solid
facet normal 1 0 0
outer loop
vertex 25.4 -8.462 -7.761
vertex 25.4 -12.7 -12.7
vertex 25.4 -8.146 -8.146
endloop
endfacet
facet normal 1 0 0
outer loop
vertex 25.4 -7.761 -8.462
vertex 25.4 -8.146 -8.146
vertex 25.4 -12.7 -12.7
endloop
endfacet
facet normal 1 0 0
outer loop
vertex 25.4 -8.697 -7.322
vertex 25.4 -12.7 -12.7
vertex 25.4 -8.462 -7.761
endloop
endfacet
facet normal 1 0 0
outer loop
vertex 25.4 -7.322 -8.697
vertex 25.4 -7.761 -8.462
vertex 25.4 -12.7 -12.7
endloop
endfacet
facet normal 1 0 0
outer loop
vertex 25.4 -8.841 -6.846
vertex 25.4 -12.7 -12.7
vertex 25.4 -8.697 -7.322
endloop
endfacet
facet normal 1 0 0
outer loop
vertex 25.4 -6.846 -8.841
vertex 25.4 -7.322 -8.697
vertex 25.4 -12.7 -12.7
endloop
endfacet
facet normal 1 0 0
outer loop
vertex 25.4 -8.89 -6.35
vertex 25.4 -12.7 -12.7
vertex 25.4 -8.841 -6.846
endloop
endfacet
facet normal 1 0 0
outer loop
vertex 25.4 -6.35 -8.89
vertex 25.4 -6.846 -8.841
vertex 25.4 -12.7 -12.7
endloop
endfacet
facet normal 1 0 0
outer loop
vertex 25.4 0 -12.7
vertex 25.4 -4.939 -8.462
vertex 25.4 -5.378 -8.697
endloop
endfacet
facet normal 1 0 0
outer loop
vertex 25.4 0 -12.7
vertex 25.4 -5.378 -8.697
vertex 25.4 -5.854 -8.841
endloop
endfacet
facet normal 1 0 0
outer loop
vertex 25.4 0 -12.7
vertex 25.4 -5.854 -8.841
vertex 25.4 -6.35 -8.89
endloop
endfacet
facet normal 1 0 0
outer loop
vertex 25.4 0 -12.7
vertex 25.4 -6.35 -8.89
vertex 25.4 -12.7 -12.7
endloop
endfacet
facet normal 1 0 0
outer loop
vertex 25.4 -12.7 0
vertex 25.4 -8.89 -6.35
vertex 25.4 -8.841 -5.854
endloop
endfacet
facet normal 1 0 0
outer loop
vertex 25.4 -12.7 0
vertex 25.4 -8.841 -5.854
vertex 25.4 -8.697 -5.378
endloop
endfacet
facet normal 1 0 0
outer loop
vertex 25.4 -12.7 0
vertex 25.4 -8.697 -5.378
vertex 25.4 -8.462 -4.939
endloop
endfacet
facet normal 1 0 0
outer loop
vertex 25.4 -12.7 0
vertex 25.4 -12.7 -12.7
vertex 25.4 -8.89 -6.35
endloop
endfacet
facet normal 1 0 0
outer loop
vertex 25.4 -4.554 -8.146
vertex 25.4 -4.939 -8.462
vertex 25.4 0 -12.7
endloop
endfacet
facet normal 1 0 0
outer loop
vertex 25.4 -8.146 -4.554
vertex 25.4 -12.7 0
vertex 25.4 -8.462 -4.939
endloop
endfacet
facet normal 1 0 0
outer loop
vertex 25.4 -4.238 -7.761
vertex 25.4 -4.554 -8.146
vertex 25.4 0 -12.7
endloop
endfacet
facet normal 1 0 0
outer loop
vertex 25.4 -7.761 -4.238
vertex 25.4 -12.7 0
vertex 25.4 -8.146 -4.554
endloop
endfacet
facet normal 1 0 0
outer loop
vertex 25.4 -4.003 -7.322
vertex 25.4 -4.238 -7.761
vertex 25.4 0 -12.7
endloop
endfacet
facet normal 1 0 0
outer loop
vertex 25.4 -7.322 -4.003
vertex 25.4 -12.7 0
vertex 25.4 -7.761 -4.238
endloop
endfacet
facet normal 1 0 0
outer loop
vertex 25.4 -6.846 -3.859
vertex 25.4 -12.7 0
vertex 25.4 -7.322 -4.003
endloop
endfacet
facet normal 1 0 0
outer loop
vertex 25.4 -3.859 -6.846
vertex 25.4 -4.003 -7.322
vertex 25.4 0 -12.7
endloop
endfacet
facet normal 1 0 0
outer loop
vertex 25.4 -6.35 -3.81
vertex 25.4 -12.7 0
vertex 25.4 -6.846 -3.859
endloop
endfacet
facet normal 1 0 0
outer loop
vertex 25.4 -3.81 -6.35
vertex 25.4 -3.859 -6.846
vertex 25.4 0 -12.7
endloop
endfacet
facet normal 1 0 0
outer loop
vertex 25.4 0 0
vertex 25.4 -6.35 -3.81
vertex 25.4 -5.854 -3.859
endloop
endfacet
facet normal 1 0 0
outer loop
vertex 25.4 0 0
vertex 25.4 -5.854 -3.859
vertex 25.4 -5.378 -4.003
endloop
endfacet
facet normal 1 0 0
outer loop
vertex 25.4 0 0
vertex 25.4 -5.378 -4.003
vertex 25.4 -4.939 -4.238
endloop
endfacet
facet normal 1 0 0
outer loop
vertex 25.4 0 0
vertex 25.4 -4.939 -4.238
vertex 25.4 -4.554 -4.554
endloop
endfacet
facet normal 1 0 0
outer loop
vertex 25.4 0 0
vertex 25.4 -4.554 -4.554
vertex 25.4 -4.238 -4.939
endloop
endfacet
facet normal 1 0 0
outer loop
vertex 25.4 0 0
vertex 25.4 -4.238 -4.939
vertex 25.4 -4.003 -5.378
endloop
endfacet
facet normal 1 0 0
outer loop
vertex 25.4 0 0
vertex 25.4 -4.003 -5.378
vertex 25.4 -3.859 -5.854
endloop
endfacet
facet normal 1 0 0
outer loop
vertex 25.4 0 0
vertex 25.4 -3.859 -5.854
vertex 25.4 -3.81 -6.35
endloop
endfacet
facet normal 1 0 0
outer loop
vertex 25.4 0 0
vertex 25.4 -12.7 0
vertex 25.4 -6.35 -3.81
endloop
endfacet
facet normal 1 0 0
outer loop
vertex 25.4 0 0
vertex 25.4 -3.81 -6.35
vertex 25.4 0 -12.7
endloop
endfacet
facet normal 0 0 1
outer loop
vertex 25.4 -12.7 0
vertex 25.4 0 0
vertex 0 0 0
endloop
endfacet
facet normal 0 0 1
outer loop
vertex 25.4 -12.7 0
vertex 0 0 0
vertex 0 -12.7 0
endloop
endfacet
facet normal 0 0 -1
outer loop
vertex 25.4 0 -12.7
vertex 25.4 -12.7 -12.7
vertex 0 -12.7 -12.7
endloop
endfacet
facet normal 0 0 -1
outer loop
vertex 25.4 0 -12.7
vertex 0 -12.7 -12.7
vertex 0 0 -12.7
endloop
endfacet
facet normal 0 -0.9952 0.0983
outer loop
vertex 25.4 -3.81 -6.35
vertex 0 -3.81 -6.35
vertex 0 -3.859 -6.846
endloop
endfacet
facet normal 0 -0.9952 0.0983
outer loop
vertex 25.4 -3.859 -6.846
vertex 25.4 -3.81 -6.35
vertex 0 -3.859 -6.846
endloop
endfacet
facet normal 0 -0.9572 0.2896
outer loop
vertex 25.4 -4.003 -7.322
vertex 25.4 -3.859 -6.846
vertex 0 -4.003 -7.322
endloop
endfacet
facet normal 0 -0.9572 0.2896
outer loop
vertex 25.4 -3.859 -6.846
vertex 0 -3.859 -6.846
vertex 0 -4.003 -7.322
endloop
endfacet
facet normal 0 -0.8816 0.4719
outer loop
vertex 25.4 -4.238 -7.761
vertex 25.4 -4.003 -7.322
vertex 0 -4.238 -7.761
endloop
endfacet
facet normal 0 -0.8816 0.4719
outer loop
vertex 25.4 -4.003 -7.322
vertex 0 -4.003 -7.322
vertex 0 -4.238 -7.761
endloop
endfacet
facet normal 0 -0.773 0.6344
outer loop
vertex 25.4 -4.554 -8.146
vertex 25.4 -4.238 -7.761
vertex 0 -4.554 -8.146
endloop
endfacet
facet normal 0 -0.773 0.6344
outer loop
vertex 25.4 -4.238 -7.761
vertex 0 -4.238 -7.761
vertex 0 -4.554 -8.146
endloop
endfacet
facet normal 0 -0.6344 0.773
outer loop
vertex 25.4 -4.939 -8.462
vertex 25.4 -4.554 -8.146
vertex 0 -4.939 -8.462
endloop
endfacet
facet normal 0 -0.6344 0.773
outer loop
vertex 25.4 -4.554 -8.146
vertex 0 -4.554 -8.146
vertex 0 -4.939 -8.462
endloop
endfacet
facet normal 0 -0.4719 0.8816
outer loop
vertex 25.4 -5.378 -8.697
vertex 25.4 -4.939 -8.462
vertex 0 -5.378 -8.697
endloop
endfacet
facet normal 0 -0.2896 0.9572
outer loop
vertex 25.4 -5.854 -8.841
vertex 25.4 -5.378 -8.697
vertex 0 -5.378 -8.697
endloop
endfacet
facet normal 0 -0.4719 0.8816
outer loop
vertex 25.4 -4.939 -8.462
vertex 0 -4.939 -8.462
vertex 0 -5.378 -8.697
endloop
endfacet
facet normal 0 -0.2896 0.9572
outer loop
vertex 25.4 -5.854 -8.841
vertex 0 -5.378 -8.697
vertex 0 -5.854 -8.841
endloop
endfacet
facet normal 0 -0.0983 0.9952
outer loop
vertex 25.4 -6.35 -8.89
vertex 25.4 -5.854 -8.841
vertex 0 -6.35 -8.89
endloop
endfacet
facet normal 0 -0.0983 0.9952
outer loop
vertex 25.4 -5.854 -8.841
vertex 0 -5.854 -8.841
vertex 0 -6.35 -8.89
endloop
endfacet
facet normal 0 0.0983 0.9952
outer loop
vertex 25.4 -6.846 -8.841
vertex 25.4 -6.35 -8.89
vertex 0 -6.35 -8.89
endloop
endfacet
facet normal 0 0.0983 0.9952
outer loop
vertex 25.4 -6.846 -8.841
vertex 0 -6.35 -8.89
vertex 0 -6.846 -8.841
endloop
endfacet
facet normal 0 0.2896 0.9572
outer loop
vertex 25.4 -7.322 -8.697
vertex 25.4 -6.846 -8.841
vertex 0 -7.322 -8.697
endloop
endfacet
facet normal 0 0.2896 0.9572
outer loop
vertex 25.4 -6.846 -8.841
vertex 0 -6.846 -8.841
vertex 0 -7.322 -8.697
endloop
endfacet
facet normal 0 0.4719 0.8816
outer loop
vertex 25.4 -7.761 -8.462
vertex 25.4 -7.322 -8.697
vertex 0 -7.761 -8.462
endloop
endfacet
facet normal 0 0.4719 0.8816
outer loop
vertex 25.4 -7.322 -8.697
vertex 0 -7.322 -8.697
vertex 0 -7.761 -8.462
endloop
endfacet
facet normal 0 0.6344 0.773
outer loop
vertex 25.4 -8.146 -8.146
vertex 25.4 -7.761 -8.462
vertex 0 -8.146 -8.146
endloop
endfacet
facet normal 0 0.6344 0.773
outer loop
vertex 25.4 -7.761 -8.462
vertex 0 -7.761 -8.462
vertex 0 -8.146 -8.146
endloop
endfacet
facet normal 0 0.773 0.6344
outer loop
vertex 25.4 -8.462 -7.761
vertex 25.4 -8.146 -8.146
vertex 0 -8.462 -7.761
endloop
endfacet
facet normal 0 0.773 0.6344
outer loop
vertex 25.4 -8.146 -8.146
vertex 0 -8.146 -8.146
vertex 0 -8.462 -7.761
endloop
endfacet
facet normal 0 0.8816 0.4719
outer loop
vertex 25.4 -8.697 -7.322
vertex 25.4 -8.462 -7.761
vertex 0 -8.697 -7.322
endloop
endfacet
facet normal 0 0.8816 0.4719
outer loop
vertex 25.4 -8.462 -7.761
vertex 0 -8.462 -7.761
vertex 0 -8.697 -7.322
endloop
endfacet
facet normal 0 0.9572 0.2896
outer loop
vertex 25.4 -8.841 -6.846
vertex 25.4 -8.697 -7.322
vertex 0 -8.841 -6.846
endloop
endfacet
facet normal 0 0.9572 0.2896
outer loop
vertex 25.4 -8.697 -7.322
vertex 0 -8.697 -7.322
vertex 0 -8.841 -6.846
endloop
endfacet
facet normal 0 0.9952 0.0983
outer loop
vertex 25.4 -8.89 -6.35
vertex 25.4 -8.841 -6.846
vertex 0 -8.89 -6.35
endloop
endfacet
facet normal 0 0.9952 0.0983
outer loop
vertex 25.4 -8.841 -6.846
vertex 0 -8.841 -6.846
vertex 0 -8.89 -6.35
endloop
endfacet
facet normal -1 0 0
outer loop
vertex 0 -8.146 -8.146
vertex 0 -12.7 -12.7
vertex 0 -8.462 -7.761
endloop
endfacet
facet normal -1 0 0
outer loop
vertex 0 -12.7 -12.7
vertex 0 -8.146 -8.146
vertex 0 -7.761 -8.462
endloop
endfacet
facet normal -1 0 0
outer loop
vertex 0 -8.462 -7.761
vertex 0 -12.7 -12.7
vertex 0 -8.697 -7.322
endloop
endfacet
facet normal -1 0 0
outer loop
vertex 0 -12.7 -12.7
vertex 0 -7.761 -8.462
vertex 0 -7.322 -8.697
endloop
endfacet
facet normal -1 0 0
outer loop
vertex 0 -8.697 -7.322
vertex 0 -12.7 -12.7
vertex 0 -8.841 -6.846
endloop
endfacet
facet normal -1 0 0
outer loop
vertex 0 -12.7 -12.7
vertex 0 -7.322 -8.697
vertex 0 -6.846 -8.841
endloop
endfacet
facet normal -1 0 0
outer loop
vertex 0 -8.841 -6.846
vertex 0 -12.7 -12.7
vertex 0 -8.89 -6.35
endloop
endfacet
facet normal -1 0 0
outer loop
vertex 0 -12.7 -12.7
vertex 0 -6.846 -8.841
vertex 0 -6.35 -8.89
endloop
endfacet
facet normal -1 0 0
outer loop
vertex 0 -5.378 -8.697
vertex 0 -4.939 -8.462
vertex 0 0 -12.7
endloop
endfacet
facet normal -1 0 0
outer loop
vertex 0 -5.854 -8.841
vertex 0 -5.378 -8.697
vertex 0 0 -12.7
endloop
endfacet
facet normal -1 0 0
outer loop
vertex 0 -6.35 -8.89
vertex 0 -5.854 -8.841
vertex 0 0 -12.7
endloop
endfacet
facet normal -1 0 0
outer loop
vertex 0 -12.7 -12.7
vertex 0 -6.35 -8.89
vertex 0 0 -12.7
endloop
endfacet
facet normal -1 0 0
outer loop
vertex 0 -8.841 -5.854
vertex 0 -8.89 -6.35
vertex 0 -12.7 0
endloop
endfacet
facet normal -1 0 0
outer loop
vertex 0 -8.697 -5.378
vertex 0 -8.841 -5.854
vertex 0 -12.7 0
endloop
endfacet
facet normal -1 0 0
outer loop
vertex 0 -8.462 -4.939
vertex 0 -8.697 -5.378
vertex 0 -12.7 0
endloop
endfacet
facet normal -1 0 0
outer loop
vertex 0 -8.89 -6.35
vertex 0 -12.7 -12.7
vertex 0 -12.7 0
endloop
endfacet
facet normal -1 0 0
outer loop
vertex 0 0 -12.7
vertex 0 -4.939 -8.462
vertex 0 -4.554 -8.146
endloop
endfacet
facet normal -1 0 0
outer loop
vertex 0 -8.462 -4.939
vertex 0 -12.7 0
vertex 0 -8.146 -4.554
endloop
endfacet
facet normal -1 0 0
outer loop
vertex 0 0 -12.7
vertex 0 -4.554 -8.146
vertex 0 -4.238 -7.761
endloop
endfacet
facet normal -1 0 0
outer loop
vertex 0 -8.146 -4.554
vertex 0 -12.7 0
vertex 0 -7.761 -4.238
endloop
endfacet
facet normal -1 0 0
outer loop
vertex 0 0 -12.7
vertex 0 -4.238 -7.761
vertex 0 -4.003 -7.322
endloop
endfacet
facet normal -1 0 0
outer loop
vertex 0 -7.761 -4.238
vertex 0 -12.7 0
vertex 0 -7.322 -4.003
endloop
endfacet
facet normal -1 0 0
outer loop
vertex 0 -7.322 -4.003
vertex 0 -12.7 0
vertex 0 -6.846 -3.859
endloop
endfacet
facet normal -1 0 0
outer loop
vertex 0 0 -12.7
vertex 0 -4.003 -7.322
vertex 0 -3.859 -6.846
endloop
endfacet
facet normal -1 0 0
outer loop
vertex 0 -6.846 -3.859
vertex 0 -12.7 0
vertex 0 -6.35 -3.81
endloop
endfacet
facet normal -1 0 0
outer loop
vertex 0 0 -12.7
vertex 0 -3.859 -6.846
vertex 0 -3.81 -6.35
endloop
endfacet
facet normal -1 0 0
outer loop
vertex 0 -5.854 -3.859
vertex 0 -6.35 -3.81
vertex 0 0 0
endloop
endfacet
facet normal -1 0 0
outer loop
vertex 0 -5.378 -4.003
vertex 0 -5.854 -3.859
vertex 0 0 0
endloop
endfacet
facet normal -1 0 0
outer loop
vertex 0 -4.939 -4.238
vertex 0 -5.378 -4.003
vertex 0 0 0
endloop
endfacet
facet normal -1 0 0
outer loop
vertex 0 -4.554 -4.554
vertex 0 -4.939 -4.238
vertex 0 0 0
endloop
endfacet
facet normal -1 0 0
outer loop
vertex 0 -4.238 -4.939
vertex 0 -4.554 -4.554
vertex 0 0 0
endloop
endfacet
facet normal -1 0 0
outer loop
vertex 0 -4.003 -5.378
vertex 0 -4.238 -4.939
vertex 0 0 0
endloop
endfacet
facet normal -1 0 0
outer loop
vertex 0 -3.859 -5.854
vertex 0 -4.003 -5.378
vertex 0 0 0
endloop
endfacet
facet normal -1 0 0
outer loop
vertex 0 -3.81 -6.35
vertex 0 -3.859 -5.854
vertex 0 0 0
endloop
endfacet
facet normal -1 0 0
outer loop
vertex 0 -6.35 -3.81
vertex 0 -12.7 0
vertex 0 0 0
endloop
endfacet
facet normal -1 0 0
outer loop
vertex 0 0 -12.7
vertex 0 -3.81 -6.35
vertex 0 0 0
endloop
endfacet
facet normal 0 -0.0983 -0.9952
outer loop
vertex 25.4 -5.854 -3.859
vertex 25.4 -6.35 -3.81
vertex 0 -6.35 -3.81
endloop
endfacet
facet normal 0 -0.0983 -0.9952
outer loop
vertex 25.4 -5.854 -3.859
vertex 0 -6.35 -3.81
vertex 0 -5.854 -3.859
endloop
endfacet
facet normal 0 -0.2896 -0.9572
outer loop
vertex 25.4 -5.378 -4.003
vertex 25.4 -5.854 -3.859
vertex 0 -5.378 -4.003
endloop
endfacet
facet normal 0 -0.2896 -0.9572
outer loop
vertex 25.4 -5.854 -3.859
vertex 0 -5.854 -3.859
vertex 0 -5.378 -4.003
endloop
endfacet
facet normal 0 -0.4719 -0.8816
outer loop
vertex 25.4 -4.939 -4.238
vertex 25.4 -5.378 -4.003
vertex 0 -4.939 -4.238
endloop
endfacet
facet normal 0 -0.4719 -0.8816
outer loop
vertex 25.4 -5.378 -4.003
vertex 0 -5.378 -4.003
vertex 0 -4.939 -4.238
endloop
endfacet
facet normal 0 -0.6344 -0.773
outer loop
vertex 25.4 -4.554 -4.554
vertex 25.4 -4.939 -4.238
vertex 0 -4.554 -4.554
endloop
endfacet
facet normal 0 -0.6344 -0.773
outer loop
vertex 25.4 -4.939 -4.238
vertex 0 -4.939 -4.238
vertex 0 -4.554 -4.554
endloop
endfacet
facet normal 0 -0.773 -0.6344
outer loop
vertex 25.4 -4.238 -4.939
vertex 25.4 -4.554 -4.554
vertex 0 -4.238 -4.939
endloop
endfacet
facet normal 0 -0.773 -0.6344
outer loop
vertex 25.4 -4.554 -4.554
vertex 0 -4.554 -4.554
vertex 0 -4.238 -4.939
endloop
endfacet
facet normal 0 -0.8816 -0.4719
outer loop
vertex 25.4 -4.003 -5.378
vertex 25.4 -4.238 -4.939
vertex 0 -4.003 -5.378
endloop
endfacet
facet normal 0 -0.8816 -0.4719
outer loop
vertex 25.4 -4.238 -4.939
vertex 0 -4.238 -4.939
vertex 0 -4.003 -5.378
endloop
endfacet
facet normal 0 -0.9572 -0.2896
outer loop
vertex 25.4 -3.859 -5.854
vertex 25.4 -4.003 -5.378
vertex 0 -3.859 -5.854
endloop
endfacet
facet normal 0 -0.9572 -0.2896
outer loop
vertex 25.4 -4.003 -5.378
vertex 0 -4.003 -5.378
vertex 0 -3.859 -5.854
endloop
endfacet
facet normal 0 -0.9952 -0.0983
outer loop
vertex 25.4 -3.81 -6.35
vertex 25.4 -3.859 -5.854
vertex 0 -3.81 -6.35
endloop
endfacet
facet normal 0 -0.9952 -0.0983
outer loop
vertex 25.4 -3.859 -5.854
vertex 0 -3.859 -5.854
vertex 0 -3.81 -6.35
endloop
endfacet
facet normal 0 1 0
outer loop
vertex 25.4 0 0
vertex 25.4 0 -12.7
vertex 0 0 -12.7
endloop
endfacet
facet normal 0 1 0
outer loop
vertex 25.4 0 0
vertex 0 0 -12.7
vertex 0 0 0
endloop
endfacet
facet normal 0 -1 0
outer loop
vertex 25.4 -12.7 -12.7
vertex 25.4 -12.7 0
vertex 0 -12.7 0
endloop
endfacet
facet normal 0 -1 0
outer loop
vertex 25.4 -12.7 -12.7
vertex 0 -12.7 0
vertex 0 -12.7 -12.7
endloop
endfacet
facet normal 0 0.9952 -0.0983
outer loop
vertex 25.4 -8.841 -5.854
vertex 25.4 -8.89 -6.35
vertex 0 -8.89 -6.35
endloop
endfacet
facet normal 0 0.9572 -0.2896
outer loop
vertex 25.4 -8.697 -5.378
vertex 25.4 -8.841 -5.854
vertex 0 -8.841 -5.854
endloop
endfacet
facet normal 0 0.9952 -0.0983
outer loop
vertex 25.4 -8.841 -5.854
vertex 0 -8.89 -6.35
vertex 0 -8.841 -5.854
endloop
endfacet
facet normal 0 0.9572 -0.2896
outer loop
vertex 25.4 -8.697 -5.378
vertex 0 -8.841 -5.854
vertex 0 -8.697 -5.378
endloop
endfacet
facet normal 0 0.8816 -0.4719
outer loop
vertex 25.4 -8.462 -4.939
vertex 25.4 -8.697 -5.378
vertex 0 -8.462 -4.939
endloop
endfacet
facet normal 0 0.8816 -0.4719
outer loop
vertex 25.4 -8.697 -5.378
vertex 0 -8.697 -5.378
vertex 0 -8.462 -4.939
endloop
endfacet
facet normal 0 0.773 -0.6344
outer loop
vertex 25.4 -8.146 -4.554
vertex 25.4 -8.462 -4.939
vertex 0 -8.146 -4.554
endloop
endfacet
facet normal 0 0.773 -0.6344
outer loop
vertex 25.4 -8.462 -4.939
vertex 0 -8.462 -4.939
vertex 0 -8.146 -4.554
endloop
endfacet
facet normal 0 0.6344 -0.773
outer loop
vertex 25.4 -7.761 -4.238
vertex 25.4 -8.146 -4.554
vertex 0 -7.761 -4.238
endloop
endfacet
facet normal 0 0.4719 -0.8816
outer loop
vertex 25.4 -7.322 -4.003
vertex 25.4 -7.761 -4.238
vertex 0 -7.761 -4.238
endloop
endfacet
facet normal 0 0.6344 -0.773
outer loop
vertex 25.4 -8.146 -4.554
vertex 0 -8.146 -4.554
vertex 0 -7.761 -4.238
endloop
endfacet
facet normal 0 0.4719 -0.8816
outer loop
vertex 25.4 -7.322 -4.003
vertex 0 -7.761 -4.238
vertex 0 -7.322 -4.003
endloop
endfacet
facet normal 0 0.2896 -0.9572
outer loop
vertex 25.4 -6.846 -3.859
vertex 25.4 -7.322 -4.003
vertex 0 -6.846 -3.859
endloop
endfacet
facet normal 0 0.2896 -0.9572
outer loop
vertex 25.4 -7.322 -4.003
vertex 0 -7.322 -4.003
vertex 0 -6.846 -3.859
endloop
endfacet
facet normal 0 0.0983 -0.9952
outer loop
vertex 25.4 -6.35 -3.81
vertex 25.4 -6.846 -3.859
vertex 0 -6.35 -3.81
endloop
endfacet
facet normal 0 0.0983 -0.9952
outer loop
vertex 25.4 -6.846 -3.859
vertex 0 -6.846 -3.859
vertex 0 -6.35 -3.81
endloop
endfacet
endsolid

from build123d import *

# Parameters (mm, degrees)
F1_DEPTH = 25.4


with BuildPart() as f1:
    # F0 (on Right) → F1 (new body)
    with BuildSketch(Plane.YZ):
        with BuildLine():
            Line((0, -6.35), (0, 0))
            Line((0, 0), (-6.35, 0))
            Line((-6.35, 0), (-6.35, -3.81))
            ThreePointArc((-6.35, -3.81), (-4.553949, -4.553949), (-3.81, -6.35))
            Line((-3.81, -6.35), (0, -6.35))
        make_face()
        with BuildLine():
            Line((-6.35, -3.81), (-6.35, 0))
            Line((-6.35, 0), (-12.7, 0))
            Line((-12.7, 0), (-12.7, -6.35))
            Line((-12.7, -6.35), (-8.89, -6.35))
            ThreePointArc((-8.89, -6.35), (-8.146051, -4.553949), (-6.35, -3.81))
        make_face()
        with BuildLine():
            Line((-8.89, -6.35), (-12.7, -6.35))
            Line((-12.7, -6.35), (-12.7, -12.7))
            Line((-12.7, -12.7), (-6.35, -12.7))
            Line((-6.35, -12.7), (-6.35, -8.89))
            ThreePointArc((-6.35, -8.89), (-8.146051, -8.146051), (-8.89, -6.35))
        make_face()
        with BuildLine():
            Line((0, -12.7), (0, -6.35))
            Line((0, -6.35), (-3.81, -6.35))
            ThreePointArc((-3.81, -6.35), (-4.553949, -8.146051), (-6.35, -8.89))
            Line((-6.35, -8.89), (-6.35, -12.7))
            Line((-6.35, -12.7), (0, -12.7))
        make_face()
    extrude(amount=F1_DEPTH)


solid = f1.part
